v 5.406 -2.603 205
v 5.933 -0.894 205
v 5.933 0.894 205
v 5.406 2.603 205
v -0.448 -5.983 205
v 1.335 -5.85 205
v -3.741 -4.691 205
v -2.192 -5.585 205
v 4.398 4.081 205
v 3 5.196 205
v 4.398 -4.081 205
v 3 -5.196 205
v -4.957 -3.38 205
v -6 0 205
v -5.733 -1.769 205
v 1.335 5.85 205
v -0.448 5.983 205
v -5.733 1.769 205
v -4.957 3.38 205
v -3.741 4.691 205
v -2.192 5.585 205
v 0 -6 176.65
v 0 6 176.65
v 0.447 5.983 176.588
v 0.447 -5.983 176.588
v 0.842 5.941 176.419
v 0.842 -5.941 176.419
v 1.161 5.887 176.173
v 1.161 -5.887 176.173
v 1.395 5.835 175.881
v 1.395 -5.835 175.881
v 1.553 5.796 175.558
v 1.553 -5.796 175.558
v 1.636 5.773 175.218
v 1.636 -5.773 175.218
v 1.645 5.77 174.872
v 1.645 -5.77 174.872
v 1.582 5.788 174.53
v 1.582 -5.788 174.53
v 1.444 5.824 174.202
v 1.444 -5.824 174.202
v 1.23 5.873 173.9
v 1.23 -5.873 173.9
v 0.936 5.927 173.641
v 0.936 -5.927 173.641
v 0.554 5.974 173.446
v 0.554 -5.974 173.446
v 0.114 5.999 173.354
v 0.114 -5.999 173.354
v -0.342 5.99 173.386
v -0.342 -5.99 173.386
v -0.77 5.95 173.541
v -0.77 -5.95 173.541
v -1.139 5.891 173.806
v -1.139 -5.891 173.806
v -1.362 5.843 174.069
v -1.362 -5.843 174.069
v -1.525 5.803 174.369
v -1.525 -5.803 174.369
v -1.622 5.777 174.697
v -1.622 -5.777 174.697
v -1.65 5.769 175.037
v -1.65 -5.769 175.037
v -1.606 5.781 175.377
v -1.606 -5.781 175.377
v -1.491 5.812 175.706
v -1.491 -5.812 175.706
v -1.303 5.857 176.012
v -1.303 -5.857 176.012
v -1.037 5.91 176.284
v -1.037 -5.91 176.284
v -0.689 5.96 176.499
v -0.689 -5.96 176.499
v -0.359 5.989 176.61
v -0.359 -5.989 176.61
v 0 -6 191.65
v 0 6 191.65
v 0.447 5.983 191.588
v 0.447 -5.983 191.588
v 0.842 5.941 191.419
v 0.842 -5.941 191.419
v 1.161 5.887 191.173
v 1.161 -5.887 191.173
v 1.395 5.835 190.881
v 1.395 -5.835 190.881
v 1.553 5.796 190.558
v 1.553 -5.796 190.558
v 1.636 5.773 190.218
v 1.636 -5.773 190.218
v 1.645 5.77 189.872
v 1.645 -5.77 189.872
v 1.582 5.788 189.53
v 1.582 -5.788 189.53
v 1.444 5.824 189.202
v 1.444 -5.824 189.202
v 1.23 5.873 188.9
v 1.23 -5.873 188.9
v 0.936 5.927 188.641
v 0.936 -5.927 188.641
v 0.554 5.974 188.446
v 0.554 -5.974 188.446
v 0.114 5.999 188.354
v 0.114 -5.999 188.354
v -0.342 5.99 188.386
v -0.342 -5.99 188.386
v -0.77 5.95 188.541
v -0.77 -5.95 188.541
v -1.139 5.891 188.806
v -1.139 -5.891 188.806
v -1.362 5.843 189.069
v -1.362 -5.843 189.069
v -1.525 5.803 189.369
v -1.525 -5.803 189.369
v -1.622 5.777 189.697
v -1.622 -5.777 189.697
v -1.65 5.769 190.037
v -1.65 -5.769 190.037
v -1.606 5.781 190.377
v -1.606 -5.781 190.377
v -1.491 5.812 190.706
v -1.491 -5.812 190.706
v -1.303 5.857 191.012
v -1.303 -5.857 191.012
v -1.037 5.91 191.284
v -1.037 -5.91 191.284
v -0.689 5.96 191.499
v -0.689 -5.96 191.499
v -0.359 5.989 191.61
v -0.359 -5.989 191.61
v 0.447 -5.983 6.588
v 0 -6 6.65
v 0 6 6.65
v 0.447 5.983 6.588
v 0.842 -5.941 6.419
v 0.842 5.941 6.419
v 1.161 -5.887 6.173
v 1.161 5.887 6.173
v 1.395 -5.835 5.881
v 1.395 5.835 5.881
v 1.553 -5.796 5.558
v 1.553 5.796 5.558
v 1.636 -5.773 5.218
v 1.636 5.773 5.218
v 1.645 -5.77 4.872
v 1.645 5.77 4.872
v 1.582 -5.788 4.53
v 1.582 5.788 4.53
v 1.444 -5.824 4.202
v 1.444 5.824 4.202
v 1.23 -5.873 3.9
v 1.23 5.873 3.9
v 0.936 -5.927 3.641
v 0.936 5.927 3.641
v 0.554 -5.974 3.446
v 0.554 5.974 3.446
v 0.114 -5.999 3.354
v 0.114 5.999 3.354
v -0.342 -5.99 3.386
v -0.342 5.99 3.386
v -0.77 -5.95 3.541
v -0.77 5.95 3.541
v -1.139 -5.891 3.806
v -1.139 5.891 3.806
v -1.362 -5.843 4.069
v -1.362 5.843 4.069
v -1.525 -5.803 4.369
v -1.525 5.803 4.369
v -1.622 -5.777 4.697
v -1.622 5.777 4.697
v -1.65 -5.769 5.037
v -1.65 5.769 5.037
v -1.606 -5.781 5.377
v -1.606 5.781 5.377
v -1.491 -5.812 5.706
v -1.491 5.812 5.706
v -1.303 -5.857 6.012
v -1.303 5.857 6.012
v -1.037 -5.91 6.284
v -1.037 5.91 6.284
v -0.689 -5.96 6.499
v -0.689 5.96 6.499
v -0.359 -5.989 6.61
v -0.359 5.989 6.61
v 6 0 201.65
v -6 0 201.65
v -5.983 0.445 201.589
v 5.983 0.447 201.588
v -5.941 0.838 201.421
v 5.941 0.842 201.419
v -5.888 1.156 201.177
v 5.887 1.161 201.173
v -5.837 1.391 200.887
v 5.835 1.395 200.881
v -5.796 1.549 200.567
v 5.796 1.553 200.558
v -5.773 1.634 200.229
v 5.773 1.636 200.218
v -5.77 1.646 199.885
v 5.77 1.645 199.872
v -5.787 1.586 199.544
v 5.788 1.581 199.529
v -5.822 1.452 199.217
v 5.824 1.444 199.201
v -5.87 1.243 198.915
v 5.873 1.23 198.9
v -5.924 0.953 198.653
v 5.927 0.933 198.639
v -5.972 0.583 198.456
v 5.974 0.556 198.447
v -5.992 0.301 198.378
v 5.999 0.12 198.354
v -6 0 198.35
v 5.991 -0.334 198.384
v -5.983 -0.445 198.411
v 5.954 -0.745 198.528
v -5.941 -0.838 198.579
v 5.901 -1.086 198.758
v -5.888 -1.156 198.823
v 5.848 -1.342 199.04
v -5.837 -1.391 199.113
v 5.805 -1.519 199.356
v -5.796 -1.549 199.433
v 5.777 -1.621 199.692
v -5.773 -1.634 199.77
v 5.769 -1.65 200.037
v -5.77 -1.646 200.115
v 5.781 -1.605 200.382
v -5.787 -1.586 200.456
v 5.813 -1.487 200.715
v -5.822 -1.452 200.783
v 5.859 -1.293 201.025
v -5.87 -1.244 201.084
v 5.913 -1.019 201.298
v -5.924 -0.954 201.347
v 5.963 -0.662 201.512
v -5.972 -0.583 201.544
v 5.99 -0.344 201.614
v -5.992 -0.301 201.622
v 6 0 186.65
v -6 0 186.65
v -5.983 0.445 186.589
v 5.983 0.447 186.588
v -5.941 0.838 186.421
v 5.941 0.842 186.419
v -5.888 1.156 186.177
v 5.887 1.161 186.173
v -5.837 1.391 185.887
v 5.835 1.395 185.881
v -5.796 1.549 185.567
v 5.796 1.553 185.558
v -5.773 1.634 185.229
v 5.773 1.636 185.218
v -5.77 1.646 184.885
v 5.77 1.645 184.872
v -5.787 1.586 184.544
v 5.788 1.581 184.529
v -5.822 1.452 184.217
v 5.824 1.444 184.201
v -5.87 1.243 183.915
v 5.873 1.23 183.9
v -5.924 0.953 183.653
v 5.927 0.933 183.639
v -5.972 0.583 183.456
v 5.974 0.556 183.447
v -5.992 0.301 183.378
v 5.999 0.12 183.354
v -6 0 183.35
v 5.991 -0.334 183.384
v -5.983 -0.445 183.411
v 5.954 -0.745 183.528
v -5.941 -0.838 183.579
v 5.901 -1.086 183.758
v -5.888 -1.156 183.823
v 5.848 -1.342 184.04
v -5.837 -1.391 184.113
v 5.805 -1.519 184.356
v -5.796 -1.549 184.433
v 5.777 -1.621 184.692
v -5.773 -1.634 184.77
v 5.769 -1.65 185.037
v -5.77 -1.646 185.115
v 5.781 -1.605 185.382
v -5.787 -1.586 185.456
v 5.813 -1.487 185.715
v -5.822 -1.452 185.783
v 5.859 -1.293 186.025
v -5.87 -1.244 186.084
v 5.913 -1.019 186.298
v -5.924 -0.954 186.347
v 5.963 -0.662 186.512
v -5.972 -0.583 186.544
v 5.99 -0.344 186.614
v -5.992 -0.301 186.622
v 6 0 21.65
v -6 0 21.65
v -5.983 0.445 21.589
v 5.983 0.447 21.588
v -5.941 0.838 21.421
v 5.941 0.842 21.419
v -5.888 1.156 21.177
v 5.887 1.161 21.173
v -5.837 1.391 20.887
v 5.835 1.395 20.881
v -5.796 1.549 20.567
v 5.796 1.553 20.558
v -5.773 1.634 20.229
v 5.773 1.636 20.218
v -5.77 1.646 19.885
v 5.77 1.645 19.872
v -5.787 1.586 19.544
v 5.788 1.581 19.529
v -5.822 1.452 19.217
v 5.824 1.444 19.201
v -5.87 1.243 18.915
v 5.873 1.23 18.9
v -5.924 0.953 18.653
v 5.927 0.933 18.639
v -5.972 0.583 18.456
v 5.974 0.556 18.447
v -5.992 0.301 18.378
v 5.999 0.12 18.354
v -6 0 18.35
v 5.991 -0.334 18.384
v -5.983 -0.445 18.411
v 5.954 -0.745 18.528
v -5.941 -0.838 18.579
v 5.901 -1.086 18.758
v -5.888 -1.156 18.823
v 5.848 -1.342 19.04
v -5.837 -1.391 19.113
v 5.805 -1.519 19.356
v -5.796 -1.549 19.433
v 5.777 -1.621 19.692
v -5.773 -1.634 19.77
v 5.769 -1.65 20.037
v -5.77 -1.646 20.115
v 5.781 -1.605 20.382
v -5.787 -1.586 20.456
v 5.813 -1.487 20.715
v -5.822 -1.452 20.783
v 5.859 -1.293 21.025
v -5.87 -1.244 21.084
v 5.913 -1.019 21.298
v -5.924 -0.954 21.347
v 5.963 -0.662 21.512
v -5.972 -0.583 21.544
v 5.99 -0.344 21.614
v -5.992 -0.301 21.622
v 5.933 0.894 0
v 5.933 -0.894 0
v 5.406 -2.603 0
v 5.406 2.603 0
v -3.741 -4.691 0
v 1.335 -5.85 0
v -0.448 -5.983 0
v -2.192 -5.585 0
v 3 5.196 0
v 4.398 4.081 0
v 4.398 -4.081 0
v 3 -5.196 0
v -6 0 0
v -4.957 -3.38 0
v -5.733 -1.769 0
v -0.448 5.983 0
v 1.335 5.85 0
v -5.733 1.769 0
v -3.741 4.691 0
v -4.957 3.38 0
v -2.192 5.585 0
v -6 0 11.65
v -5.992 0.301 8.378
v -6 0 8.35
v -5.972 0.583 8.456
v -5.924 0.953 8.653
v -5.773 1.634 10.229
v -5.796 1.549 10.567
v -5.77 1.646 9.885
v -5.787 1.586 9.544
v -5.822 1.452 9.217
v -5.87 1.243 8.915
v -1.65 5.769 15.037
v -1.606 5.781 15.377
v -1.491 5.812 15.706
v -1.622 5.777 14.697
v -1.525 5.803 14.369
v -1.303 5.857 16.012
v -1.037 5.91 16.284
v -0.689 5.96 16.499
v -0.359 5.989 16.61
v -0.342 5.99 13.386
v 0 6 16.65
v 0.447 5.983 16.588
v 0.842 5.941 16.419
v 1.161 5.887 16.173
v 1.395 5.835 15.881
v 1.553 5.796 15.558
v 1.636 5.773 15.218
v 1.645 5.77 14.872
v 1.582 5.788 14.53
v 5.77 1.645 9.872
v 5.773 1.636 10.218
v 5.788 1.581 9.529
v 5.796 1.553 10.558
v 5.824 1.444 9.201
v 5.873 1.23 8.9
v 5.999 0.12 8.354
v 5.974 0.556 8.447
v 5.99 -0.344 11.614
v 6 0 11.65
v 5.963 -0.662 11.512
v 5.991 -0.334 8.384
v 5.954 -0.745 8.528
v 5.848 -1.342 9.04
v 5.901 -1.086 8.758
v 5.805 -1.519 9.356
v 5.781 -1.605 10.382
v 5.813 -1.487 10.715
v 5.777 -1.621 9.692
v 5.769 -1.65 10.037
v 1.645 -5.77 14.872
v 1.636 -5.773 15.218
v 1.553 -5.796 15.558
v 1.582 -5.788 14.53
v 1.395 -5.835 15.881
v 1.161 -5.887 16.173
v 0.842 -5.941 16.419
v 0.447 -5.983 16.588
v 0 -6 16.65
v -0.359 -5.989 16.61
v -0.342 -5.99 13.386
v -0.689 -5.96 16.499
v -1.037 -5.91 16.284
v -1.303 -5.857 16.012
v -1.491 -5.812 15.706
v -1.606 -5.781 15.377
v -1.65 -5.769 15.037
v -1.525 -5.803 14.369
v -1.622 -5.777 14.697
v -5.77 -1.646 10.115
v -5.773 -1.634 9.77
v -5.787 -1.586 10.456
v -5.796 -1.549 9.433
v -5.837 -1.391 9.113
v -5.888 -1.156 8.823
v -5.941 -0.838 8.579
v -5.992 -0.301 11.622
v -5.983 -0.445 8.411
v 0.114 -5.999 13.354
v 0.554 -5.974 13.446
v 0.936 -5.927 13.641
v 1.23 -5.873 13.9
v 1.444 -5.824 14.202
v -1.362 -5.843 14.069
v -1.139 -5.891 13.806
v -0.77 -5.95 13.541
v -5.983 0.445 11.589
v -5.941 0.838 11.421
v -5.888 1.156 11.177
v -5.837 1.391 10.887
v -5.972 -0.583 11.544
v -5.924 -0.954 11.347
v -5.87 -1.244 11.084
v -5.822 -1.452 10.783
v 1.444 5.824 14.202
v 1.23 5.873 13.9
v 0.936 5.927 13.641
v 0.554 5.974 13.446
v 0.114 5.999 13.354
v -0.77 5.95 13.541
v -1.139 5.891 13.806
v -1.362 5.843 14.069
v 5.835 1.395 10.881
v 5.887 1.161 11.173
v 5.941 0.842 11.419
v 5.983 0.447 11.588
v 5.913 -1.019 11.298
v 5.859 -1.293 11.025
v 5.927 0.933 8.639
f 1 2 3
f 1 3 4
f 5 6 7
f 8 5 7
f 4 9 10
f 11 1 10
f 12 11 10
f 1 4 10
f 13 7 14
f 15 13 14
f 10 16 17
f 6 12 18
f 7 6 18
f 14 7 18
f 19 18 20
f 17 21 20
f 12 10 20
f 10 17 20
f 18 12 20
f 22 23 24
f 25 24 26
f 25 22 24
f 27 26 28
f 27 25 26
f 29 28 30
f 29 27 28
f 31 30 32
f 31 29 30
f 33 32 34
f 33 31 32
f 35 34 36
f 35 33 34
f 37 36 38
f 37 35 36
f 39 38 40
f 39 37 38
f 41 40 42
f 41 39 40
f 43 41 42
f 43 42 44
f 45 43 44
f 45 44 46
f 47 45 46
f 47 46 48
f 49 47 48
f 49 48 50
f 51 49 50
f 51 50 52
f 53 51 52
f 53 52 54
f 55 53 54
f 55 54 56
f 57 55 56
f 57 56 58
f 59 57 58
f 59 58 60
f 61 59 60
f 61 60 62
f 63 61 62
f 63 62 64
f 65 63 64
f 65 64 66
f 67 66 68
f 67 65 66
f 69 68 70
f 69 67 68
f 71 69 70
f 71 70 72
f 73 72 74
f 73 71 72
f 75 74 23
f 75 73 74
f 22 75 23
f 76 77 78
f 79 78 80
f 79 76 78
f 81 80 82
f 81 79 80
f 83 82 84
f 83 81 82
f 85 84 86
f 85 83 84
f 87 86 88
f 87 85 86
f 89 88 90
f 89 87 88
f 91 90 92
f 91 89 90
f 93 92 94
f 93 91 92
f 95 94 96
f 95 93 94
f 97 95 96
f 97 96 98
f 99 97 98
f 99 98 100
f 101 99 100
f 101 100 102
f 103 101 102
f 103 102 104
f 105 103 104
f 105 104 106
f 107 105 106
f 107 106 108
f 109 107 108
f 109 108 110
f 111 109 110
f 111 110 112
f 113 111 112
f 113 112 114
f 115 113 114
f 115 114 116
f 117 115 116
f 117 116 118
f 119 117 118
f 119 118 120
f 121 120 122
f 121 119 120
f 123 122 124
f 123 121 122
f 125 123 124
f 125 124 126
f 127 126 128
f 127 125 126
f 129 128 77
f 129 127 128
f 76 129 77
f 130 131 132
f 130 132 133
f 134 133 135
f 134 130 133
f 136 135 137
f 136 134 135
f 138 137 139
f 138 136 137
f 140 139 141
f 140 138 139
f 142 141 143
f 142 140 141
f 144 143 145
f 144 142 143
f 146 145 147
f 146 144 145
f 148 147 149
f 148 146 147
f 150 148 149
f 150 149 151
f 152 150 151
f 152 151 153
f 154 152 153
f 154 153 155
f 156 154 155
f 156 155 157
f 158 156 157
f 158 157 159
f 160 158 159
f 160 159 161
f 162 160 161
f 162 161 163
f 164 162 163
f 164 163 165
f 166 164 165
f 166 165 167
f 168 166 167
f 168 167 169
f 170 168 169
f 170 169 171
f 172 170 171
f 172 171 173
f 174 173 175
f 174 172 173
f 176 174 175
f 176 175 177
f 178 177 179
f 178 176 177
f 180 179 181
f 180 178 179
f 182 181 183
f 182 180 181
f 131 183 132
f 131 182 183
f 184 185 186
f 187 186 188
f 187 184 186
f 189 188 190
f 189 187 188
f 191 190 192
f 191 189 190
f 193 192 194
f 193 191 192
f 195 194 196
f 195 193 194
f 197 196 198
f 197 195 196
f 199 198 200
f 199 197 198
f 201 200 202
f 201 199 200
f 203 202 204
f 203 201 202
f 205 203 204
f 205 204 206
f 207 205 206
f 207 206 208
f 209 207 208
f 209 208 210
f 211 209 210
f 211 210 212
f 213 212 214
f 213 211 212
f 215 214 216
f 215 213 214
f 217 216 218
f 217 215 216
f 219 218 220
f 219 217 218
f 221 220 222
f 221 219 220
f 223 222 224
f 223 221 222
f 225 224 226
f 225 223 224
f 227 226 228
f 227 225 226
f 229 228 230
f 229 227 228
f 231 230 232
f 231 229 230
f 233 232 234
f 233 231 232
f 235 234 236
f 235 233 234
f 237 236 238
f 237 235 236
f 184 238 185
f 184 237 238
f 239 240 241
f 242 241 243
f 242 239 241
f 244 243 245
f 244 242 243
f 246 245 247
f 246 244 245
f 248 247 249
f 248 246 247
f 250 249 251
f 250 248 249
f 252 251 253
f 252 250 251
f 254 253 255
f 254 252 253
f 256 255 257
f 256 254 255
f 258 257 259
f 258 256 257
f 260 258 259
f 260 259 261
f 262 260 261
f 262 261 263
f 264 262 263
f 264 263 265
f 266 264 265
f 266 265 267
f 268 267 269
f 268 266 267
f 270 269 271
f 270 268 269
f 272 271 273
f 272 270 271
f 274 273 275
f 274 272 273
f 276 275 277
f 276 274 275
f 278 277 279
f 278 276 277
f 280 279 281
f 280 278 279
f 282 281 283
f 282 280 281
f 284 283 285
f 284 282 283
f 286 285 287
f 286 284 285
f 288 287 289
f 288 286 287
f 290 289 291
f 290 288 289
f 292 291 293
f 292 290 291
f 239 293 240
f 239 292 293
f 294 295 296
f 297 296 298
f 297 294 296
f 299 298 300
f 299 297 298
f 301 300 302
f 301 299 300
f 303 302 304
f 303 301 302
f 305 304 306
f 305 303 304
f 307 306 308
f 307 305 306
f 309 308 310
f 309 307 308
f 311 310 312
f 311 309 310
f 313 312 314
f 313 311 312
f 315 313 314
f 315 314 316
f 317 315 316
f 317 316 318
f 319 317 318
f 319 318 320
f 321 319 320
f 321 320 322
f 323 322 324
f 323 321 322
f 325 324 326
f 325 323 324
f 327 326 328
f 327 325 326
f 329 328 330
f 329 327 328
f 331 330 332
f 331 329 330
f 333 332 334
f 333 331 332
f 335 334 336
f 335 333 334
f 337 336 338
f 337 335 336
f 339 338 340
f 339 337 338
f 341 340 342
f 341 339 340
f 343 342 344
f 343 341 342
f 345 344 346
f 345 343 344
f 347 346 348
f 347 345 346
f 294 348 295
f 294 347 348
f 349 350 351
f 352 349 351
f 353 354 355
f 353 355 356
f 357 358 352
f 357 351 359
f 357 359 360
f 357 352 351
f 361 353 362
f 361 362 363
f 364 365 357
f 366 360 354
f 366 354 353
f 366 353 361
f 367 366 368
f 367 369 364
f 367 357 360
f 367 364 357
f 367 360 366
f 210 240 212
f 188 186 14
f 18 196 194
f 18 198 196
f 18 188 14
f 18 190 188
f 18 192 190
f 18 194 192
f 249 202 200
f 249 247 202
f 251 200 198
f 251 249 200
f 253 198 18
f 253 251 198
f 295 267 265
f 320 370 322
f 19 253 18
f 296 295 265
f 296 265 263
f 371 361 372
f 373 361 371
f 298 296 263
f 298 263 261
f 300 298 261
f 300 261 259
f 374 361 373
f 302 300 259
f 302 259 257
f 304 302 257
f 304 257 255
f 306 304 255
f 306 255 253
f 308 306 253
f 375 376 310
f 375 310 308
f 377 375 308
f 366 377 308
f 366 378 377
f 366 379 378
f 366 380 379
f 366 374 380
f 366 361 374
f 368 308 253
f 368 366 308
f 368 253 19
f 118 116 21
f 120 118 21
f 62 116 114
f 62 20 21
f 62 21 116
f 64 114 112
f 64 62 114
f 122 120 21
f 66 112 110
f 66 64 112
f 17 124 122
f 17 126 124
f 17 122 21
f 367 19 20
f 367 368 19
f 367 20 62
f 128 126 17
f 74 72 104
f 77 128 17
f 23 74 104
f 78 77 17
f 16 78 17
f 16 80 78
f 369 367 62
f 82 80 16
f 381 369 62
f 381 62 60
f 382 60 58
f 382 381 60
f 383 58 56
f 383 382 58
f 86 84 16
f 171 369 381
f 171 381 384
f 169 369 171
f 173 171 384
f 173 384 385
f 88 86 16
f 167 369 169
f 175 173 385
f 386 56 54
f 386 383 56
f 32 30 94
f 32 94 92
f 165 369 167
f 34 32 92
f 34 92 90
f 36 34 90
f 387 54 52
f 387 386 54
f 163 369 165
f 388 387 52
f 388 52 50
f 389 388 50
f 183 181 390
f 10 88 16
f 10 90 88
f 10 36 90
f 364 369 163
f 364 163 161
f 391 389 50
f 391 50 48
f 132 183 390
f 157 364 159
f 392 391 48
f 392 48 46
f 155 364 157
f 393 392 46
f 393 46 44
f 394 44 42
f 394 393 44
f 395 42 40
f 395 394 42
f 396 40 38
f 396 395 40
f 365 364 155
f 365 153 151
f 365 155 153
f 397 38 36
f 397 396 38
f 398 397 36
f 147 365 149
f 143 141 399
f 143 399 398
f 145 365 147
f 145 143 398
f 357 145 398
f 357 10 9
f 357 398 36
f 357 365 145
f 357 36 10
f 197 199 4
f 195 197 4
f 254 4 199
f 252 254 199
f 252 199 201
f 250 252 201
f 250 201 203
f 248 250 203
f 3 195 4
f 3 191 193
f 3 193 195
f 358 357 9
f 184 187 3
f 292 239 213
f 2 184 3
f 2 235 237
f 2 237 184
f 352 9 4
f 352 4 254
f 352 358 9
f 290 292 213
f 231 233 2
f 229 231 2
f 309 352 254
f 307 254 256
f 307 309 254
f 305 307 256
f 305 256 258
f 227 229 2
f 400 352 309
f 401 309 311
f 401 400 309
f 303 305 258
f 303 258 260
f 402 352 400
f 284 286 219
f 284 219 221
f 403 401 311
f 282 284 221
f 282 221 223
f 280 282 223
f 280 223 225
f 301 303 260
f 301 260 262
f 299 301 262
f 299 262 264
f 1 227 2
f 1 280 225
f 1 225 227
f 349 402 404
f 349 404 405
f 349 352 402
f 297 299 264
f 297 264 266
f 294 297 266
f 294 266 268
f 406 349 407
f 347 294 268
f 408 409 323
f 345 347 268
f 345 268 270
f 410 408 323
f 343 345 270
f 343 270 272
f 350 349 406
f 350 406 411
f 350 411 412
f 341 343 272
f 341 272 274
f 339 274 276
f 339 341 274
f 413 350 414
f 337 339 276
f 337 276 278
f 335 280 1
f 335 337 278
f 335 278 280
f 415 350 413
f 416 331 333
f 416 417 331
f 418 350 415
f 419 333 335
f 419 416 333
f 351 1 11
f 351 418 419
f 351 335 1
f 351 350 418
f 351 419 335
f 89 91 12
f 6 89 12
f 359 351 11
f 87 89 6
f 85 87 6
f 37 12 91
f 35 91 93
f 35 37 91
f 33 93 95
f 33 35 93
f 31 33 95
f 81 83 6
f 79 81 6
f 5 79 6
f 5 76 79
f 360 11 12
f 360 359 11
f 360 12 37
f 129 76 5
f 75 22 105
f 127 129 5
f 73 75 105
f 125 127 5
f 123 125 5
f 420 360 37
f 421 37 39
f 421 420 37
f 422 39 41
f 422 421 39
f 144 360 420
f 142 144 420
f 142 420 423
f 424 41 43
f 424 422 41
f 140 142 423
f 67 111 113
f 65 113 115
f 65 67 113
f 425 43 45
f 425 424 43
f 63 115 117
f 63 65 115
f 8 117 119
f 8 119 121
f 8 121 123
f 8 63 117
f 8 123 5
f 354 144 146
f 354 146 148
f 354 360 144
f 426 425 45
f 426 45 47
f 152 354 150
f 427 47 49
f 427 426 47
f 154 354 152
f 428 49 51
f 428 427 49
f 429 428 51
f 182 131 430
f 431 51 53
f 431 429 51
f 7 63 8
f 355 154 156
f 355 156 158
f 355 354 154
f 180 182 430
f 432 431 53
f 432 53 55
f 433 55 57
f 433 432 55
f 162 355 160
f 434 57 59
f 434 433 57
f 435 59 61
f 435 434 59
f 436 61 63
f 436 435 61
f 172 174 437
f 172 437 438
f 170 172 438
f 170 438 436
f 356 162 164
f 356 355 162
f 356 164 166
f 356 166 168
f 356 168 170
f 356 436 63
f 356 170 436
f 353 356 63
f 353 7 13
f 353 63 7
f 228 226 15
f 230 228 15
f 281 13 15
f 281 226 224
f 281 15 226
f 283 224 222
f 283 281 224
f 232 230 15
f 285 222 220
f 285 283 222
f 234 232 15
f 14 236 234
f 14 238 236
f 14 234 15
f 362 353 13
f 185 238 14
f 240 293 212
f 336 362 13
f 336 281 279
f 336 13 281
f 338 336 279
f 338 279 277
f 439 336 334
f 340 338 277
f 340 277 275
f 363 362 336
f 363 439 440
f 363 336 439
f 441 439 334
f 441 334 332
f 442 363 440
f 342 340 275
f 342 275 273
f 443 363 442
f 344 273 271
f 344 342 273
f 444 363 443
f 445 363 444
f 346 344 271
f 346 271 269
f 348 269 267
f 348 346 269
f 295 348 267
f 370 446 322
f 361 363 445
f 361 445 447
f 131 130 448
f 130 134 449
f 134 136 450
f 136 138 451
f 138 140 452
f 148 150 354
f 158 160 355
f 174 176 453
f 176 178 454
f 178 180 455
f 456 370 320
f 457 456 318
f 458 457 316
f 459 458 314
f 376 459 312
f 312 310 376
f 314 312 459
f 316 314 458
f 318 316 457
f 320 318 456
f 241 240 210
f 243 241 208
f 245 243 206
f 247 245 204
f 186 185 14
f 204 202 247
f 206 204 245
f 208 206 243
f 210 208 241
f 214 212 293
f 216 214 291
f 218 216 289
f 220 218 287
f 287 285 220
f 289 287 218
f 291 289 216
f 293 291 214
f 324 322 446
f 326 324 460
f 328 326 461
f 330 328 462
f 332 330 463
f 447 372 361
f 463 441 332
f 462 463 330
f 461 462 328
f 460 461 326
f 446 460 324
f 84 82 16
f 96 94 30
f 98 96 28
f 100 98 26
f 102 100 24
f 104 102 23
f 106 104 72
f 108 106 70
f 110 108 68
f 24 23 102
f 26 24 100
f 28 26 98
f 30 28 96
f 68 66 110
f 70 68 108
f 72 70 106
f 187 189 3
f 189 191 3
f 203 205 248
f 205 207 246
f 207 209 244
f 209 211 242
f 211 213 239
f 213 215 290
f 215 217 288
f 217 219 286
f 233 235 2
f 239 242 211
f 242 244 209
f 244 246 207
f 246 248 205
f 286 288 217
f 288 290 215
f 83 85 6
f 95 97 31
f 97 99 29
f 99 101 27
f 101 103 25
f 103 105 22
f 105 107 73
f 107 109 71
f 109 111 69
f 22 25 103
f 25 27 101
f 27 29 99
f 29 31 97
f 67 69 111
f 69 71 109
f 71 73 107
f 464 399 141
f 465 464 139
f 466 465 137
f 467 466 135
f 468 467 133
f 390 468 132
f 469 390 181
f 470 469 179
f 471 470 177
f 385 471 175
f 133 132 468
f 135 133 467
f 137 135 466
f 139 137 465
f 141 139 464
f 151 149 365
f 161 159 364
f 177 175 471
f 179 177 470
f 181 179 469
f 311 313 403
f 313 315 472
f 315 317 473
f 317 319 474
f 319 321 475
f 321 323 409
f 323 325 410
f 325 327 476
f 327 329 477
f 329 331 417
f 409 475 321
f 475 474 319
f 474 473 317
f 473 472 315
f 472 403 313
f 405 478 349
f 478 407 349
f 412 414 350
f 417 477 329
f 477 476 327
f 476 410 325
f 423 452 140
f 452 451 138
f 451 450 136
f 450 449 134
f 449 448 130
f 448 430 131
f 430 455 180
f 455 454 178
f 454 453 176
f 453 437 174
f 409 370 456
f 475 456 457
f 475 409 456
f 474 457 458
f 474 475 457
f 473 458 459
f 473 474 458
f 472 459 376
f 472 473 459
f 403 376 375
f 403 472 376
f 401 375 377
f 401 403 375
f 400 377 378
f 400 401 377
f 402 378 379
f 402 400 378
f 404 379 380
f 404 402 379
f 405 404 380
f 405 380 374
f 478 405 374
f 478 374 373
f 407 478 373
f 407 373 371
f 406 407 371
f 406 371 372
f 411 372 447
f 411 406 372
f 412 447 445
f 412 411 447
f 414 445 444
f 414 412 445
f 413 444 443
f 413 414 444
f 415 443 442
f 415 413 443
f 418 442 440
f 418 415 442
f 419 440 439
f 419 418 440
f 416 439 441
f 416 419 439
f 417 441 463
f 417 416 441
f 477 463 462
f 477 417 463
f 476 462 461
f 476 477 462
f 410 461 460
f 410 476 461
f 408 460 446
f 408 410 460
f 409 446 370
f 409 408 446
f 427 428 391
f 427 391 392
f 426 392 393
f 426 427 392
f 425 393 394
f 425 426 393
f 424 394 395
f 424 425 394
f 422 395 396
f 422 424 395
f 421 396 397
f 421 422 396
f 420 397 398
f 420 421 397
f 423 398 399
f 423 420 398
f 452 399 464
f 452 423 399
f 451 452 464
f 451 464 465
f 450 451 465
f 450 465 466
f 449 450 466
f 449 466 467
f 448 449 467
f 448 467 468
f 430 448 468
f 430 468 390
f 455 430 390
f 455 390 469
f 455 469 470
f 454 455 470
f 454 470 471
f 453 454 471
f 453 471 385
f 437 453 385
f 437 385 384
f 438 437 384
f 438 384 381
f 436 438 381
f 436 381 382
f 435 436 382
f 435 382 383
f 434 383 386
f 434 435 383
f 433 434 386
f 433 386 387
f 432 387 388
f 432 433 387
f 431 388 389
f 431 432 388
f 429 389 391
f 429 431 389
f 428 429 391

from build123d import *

# Parameters (mm, degrees)
SKETCH_1_W               = 8
SKETCH_1_H               = 8
SKETCH_1_W_2             = 4
SKETCH_1_H_2             = 4
EXTRUDE_1_DEPTH          = 205
SKETCH_7_R               = 6
EXTRUDE_2_DEPTH          = 205
CUT_EXTRUDE_1_DEPTH      = 206.175534604
CUT_EXTRUDE_1_DEPTH_BACK = 206.175534604
SKETCH_2_R               = 1.65
CUT_EXTRUDE_2_DEPTH      = 206.17553471
CUT_EXTRUDE_2_DEPTH_BACK = 206.17553471
SKETCH_3_R               = 1.65
CUT_EXTRUDE_3_DEPTH      = 206.17553471
CUT_EXTRUDE_3_DEPTH_BACK = 206.17553471
SKETCH_4_R               = 1.65
CUT_EXTRUDE_4_DEPTH      = 206.17553471
CUT_EXTRUDE_4_DEPTH_BACK = 206.17553471
SKETCH_5_R               = 1.65


with BuildPart() as part:
    # 草图1 → 凸台-拉伸1 (new body)
    with BuildSketch(Plane.XY):
        Rectangle(SKETCH_1_W, SKETCH_1_H)
        Rectangle(SKETCH_1_W_2, SKETCH_1_H_2, mode=Mode.SUBTRACT)
    extrude(amount=EXTRUDE_1_DEPTH)

    # 草图7 → 凸台-拉伸2 (add)
    with BuildSketch(Plane(origin=(0, 0, 0), x_dir=(-1, 0, 0), z_dir=(0, 0, -1))):
        Circle(SKETCH_7_R)
    extrude(amount=-EXTRUDE_2_DEPTH)

    # 草图2 → 切除-拉伸1 (cut, two sides: drawn at the far end of the back side and taken through both)
    with BuildSketch(Plane(origin=(0, 0, 0), x_dir=(1, 0, 0), z_dir=(0, 1, 0)).offset(-CUT_EXTRUDE_1_DEPTH_BACK)):
        with Locations(Location((0, -5, 0), (0, 0, 270))):
            Circle(SKETCH_2_R)
        with Locations(Location((0, -15, 0), (0, 0, 270))):
            Circle(SKETCH_2_R)
    extrude(amount=CUT_EXTRUDE_1_DEPTH + CUT_EXTRUDE_1_DEPTH_BACK, mode=Mode.SUBTRACT)

    # 草图3 → 切除-拉伸2 (cut, two sides: drawn at the far end of the back side and taken through both)
    with BuildSketch(Plane.ZY.offset(-CUT_EXTRUDE_2_DEPTH_BACK)):
        with Locations((10, 0)):
            Circle(SKETCH_3_R)
        with Locations((20, 0)):
            Circle(SKETCH_3_R)
    extrude(amount=CUT_EXTRUDE_2_DEPTH + CUT_EXTRUDE_2_DEPTH_BACK, mode=Mode.SUBTRACT)

    # 草图4 → 切除-拉伸3 (cut, two sides: drawn at the far end of the back side and taken through both)
    with BuildSketch(Plane.ZY.offset(-CUT_EXTRUDE_3_DEPTH_BACK)):
        with Locations((200, 0)):
            Circle(SKETCH_4_R)
        with Locations((185, 0)):
            Circle(SKETCH_4_R)
    extrude(amount=CUT_EXTRUDE_3_DEPTH + CUT_EXTRUDE_3_DEPTH_BACK, mode=Mode.SUBTRACT)

    # 草图5 → 切除-拉伸4 (cut, two sides: drawn at the far end of the back side and taken through both)
    with BuildSketch(Plane(origin=(0, 0, 0), x_dir=(1, 0, 0), z_dir=(0, 1, 0)).offset(-CUT_EXTRUDE_4_DEPTH_BACK)):
        with Locations(Location((0, -190, 0), (0, 0, 270))):
            Circle(SKETCH_5_R)
        with Locations(Location((0, -175, 0), (0, 0, 270))):
            Circle(SKETCH_5_R)
    extrude(amount=CUT_EXTRUDE_4_DEPTH + CUT_EXTRUDE_4_DEPTH_BACK, mode=Mode.SUBTRACT)


solid = part.part
